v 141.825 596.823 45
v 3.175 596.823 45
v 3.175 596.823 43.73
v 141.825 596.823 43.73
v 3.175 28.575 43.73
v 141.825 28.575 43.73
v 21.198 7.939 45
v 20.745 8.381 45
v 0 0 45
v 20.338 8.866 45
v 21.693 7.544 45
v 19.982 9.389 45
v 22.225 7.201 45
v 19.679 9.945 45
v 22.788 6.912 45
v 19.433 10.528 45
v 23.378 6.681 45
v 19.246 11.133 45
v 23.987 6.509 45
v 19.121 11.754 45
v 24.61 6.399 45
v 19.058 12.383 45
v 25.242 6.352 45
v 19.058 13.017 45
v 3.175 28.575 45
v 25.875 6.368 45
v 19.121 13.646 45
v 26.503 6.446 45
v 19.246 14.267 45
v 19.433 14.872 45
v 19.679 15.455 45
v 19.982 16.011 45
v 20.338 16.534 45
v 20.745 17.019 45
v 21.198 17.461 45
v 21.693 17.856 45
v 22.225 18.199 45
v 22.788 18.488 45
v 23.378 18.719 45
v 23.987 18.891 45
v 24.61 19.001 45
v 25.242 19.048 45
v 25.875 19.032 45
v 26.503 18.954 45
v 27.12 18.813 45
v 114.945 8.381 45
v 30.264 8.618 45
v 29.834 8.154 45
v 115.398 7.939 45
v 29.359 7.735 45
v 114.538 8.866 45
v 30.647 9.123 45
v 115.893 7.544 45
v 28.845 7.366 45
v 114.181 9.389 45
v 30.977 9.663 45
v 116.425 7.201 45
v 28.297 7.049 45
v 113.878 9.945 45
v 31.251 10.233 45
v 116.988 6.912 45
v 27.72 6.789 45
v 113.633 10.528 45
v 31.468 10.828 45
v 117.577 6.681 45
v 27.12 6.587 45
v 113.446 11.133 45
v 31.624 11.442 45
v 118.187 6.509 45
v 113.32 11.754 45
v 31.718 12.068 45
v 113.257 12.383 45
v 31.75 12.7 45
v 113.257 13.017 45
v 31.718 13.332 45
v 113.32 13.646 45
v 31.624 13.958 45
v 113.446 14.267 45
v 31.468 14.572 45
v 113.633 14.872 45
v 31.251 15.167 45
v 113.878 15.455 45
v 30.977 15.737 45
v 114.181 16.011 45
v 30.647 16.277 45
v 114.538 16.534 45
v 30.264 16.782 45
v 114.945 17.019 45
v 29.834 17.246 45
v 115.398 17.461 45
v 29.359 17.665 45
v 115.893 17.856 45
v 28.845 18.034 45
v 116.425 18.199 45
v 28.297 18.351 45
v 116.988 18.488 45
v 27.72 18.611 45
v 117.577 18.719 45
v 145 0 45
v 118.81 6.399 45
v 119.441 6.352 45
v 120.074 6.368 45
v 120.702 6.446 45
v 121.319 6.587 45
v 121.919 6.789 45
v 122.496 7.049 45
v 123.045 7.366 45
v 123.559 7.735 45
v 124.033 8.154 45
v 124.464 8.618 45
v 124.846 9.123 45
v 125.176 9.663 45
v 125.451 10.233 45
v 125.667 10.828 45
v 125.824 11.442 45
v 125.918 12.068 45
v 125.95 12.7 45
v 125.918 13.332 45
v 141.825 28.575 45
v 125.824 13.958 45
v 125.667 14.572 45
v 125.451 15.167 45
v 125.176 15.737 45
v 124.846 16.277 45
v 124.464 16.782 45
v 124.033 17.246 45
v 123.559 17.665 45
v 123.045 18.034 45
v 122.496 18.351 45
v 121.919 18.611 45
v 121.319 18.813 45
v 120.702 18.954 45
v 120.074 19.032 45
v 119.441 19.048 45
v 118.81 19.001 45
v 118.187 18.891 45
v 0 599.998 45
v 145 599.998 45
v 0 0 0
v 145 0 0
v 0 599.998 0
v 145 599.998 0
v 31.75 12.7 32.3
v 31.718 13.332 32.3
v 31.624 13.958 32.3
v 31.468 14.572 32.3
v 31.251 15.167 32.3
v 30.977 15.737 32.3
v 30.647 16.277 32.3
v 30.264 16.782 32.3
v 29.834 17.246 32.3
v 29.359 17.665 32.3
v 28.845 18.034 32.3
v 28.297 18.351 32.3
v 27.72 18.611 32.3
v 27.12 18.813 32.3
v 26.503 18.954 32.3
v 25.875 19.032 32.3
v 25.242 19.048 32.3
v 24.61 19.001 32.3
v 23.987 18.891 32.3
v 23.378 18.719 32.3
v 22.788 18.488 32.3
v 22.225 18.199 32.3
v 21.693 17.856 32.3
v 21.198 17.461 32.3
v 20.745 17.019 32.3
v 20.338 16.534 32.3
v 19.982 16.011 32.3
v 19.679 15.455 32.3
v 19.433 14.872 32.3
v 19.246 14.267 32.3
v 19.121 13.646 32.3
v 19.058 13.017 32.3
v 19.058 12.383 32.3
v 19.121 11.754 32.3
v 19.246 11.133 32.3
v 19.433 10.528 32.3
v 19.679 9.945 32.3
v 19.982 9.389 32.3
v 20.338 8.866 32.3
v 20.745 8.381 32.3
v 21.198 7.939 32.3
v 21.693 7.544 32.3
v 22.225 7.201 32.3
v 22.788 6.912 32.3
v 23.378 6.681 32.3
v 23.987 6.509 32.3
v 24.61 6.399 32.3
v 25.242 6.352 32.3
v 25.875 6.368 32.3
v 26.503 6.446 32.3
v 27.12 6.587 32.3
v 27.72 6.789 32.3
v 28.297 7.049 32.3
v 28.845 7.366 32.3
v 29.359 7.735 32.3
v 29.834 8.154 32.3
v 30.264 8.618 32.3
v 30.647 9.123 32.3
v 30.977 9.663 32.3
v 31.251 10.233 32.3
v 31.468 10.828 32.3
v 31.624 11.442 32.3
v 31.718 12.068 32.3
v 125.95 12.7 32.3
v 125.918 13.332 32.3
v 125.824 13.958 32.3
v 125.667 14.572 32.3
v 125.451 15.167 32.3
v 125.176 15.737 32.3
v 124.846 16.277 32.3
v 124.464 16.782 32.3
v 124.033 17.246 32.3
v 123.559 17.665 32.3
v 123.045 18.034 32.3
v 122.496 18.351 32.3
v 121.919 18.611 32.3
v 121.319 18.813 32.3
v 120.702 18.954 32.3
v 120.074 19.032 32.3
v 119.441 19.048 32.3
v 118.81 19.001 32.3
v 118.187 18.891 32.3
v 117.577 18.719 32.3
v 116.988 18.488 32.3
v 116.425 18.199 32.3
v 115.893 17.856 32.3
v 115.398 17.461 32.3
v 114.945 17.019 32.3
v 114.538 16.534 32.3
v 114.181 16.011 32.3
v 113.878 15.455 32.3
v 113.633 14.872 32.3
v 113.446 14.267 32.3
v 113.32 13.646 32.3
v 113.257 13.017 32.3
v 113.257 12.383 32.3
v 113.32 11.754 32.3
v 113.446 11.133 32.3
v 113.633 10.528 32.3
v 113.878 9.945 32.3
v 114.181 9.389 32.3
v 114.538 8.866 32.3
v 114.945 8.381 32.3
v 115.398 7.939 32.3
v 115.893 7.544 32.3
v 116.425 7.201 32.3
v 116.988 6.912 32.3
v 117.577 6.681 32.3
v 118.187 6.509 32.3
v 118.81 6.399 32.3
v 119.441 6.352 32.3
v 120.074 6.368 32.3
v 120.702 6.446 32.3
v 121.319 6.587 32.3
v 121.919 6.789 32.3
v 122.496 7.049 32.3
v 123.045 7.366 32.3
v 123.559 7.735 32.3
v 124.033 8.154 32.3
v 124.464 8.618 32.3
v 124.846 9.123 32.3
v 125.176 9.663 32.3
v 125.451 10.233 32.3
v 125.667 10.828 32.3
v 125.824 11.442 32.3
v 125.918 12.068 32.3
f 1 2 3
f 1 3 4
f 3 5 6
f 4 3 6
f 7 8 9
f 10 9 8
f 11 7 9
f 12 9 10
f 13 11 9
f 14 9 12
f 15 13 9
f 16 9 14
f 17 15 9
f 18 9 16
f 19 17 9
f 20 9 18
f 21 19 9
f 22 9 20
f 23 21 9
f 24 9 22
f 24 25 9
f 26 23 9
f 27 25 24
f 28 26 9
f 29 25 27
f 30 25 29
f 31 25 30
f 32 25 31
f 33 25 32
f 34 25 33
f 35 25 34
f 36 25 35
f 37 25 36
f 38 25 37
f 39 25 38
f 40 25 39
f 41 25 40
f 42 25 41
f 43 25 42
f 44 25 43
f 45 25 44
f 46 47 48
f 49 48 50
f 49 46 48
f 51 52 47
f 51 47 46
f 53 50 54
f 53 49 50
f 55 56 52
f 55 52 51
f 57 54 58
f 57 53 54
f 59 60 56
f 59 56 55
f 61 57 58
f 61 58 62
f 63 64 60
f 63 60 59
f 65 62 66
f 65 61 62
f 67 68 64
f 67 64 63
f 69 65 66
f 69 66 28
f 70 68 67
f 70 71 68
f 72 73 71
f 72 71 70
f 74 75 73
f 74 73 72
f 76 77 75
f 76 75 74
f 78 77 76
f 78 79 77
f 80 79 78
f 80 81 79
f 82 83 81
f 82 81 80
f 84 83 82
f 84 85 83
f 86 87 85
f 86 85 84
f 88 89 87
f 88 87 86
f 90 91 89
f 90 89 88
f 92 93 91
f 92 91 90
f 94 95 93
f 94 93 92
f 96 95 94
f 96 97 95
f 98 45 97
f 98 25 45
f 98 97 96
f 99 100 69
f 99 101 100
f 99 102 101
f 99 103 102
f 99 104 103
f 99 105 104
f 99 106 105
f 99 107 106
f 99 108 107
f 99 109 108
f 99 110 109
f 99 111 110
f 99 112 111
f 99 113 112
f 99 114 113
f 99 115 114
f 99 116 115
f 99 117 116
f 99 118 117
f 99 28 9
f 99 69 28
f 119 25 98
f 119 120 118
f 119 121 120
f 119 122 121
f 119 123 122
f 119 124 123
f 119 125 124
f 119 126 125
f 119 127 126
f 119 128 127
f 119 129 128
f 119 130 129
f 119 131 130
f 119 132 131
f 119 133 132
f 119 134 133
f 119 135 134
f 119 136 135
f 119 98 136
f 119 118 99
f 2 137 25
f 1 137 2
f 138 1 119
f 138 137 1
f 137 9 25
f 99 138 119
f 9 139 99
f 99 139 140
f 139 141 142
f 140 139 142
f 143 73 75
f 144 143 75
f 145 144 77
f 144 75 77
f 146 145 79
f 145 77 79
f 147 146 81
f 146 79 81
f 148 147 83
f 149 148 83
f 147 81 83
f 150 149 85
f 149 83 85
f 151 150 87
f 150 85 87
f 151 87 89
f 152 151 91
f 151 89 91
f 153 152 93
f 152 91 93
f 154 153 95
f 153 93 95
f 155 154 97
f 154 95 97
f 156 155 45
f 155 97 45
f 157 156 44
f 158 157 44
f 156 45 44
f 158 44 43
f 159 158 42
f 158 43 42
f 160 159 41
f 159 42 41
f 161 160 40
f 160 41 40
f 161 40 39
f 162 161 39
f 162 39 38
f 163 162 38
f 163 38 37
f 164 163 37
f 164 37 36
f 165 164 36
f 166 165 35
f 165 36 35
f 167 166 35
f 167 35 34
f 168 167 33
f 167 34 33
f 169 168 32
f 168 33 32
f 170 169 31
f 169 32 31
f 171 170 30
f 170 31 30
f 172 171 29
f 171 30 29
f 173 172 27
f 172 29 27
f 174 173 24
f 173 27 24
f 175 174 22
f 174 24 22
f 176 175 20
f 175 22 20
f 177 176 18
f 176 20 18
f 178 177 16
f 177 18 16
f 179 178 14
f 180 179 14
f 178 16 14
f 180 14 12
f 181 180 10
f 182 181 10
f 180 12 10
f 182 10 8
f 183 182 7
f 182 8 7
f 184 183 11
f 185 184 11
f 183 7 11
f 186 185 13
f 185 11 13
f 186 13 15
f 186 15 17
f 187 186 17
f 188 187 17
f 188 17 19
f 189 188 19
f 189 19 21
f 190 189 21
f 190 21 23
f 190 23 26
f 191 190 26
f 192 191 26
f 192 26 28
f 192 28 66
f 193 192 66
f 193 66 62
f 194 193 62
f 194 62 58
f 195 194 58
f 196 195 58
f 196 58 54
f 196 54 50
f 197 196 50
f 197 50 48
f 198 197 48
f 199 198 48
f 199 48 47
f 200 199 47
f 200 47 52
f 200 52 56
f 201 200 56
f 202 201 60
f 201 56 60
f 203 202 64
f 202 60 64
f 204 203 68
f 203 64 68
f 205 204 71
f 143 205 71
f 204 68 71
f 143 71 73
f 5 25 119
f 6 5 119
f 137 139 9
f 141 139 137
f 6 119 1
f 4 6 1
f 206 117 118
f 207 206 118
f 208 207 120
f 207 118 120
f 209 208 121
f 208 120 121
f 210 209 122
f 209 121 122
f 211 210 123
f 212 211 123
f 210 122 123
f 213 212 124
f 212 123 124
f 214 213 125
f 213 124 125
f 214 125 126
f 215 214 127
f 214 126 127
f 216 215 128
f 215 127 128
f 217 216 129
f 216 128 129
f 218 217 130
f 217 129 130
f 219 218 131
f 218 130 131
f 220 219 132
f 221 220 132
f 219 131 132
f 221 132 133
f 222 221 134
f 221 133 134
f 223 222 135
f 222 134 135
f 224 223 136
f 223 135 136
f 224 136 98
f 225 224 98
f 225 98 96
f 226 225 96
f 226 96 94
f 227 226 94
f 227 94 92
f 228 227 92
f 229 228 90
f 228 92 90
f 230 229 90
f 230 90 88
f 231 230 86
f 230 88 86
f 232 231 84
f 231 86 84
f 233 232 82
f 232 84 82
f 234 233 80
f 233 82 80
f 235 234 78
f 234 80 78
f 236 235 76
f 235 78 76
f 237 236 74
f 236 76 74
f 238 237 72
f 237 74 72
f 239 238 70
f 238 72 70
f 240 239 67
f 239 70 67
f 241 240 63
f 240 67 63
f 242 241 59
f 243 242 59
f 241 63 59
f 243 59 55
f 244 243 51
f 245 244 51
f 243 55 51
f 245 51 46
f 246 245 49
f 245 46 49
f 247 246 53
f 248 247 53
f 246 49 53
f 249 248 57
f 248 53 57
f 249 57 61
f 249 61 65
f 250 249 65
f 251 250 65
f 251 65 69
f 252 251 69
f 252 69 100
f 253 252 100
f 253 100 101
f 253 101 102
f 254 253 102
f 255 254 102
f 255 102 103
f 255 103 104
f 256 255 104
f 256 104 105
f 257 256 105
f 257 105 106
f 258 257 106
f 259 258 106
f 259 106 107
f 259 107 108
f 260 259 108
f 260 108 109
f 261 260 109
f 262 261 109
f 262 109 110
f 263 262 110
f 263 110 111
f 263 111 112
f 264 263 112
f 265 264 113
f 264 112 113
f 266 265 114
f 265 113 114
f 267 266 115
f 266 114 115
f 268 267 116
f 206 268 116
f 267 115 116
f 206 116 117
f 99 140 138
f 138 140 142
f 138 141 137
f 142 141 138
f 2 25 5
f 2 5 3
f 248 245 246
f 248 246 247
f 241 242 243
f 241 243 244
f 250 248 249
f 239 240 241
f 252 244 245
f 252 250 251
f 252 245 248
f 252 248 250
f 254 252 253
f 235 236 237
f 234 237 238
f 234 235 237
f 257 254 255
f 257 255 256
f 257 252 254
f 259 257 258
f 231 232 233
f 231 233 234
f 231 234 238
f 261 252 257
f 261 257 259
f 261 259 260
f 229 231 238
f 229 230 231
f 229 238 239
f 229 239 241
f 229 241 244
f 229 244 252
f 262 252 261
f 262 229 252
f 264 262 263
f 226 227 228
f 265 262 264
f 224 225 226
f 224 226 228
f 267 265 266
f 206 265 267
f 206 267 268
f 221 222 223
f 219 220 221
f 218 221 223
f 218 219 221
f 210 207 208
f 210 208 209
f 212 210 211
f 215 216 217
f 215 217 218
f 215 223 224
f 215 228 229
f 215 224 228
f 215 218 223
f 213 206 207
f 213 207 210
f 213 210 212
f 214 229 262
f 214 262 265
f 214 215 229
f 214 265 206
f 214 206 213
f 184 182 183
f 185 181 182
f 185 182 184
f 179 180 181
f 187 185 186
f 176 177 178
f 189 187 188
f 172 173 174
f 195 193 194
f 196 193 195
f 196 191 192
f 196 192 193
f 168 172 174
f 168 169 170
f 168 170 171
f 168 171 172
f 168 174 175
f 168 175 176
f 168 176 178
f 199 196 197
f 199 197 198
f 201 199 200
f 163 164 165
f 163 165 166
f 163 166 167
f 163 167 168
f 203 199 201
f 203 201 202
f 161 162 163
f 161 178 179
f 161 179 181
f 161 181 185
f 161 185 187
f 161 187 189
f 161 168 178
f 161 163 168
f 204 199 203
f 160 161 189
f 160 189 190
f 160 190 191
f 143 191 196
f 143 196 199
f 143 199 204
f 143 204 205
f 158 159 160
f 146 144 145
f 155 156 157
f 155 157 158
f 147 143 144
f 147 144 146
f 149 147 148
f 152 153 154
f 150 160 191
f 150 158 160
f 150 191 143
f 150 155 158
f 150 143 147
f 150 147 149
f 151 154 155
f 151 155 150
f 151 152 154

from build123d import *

# Parameters (mm, degrees)
F0_W     = 144.999558
F0_H     = 599.998292
F1_DEPTH = 44.999859
F2_W     = 138.649558
F2_H     = 568.248292
F3_DEPTH = 1.27
F4_R     = 6.35
F5_DEPTH = 12.7


with BuildPart() as f1:
    # F0 (on Top) → F1 (new body)
    with BuildSketch(Plane.XY):
        with Locations((72.499779, 299.999146)):
            Rectangle(F0_W, F0_H)
    extrude(amount=F1_DEPTH)

    # F2 (on face) → F3 (cut)
    with BuildSketch(Plane.XY.offset(44.999859)):
        with Locations((72.499779, 312.699146)):
            Rectangle(F2_W, F2_H)
    extrude(amount=-F3_DEPTH, mode=Mode.SUBTRACT)

    # F4 (on face) → F5 (cut)
    with BuildSketch(Plane.XY.offset(44.999859)):
        with Locations((25.4, 12.7)):
            Circle(F4_R)
        with Locations((119.599558, 12.7)):
            Circle(F4_R)
    extrude(amount=-F5_DEPTH, mode=Mode.SUBTRACT)


solid = f1.part
